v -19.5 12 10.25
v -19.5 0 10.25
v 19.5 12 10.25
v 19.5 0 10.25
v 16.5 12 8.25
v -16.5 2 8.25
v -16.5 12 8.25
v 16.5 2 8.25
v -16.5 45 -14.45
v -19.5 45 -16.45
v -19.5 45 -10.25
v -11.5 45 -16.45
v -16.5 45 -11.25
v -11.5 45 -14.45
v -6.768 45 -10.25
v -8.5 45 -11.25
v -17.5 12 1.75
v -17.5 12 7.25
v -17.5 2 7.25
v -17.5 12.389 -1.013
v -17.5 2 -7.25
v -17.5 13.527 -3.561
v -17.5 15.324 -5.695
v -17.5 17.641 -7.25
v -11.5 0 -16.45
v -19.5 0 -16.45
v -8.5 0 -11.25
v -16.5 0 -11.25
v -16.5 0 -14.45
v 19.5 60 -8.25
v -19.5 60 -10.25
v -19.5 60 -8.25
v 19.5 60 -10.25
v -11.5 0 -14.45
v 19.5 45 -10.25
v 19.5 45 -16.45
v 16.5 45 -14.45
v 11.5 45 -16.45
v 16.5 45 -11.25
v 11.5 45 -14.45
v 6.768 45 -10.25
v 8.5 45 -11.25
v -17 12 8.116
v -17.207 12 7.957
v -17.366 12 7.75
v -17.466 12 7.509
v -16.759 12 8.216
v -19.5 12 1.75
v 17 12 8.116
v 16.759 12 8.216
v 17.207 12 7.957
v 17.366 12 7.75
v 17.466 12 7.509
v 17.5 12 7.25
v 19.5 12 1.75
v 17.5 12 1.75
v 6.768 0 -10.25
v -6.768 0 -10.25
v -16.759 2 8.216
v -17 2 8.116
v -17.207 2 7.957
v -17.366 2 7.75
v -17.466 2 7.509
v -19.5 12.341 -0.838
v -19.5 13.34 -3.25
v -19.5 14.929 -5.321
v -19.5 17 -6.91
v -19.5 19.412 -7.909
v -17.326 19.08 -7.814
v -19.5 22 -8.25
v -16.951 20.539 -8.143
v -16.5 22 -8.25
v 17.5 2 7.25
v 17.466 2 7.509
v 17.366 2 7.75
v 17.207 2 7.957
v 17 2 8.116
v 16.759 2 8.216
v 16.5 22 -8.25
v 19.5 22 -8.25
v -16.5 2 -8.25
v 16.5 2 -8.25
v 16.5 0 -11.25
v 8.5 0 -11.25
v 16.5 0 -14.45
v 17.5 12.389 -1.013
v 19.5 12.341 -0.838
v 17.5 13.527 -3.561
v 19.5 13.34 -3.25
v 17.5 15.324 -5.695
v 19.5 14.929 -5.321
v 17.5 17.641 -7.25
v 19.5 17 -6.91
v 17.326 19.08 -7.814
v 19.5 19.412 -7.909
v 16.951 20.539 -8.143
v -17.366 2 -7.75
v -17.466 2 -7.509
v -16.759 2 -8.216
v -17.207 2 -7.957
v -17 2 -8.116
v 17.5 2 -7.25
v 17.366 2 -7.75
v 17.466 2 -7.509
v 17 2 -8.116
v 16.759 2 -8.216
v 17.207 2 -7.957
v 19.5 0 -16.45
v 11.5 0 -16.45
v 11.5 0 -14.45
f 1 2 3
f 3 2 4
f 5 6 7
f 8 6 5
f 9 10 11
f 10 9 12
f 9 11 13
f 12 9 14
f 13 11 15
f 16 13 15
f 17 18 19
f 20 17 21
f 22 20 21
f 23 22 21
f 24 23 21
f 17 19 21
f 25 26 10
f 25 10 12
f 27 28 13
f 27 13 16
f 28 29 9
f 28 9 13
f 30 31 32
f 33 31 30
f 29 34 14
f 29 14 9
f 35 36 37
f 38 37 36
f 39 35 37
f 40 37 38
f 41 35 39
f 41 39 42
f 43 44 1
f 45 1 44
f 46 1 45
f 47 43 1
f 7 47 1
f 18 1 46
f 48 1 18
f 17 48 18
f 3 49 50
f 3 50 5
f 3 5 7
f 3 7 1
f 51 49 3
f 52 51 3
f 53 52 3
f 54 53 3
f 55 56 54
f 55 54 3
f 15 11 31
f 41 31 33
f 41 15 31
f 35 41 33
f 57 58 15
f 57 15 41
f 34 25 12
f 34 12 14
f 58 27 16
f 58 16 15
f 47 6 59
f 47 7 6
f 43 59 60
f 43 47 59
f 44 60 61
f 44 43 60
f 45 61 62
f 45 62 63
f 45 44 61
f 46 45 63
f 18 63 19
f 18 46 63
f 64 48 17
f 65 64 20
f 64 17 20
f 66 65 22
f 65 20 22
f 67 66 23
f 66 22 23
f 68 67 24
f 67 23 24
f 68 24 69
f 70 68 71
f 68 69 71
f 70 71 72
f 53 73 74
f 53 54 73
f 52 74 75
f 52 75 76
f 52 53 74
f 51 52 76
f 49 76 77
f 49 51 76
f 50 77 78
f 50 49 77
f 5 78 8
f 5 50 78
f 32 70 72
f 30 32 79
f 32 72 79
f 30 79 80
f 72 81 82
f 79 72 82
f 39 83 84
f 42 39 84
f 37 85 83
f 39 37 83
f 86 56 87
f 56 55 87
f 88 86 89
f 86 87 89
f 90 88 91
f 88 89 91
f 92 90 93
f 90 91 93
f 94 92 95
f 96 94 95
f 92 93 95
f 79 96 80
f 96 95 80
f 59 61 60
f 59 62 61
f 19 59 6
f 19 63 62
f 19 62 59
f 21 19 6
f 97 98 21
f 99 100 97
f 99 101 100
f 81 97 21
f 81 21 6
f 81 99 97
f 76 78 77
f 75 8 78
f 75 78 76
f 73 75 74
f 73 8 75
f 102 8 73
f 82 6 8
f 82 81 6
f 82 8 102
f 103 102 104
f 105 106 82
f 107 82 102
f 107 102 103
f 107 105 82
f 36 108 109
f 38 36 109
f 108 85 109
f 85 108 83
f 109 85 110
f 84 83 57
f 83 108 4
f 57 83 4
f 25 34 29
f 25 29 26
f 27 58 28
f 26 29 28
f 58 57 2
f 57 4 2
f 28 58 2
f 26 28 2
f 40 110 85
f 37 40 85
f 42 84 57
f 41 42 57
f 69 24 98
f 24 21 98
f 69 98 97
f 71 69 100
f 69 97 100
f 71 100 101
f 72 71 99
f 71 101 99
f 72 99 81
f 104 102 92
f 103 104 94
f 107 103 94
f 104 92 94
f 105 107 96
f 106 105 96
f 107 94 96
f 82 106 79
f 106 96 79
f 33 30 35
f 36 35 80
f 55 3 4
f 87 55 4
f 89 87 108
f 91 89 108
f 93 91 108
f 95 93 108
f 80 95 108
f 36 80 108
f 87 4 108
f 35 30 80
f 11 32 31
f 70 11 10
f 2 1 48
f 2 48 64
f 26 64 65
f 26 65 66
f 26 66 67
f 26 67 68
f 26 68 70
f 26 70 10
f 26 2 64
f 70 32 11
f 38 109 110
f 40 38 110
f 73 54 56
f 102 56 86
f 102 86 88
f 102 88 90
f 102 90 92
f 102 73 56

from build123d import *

# Parameters (mm, degrees)
SKETCH1_W           = 39
SKETCH1_H           = 20.5
BOSS_EXTRUDE1_DEPTH = 2
SKETCH2_W           = 39
SKETCH2_H           = 20.5
SKETCH2_W_2         = 35
SKETCH2_H_2         = 16.5
BOSS_EXTRUDE2_DEPTH = 10
SKETCH3_W           = 39
SKETCH3_H           = 2
BOSS_EXTRUDE3_DEPTH = 48
FILLET1_R           = 10
FILLET2_R           = 1
BOSS_EXTRUDE4_DEPTH = 45


with BuildPart() as part:
    # Sketch1 → Boss-Extrude1 (new body)
    with BuildSketch(Plane(origin=(0, 0, 0), x_dir=(1, 0, 0), z_dir=(0, 1, 0))):
        Rectangle(SKETCH1_W, SKETCH1_H)
    extrude(amount=BOSS_EXTRUDE1_DEPTH)

    # Sketch2 → Boss-Extrude2 (add)
    with BuildSketch(Plane(origin=(0, 2, 0), x_dir=(1, 0, 0), z_dir=(0, 1, 0))):
        Rectangle(SKETCH2_W, SKETCH2_H)
        Rectangle(SKETCH2_W_2, SKETCH2_H_2, mode=Mode.SUBTRACT)
    extrude(amount=BOSS_EXTRUDE2_DEPTH)

    # Sketch3 → Boss-Extrude3 (add)
    with BuildSketch(Plane(origin=(0, 12, 0), x_dir=(1, 0, 0), z_dir=(0, 1, 0))):
        with Locations((0, 9.25)):
            Rectangle(SKETCH3_W, SKETCH3_H)
    extrude(amount=BOSS_EXTRUDE3_DEPTH)

    # Fillet1
    fillet1_edges = [part.edges().sort_by_distance(p)[0] for p in [
        (18.5, 12, -8.25),
        (-18.5, 12, -8.25),
    ]]
    fillet(fillet1_edges, radius=FILLET1_R)

    # Fillet2
    fillet2_edges = [part.edges().sort_by_distance(p)[0] for p in [
        (-17.5, 7, 8.25),
        (17.5, 7, 8.25),
        (17.5, 12, -8.25),
        (-17.5, 12, -8.25),
    ]]
    fillet(fillet2_edges, radius=FILLET2_R)

    # Sketch4 → Boss-Extrude4 (add)
    with BuildSketch(Plane.XZ):
        Polygon((-19.5, -10.25), (-19.5, -16.45), (-11.5, -16.45), (-11.5, -14.45), (-16.5, -14.45), (-16.5, -11.25), (-8.5, -11.25), (-6.767949192, -10.25), align=None)
    boss_extrude4 = extrude(amount=-BOSS_EXTRUDE4_DEPTH)

    # Mirror2: Boss-Extrude4 across plane
    add(boss_extrude4.mirror(Plane.ZY))


solid = part.part
